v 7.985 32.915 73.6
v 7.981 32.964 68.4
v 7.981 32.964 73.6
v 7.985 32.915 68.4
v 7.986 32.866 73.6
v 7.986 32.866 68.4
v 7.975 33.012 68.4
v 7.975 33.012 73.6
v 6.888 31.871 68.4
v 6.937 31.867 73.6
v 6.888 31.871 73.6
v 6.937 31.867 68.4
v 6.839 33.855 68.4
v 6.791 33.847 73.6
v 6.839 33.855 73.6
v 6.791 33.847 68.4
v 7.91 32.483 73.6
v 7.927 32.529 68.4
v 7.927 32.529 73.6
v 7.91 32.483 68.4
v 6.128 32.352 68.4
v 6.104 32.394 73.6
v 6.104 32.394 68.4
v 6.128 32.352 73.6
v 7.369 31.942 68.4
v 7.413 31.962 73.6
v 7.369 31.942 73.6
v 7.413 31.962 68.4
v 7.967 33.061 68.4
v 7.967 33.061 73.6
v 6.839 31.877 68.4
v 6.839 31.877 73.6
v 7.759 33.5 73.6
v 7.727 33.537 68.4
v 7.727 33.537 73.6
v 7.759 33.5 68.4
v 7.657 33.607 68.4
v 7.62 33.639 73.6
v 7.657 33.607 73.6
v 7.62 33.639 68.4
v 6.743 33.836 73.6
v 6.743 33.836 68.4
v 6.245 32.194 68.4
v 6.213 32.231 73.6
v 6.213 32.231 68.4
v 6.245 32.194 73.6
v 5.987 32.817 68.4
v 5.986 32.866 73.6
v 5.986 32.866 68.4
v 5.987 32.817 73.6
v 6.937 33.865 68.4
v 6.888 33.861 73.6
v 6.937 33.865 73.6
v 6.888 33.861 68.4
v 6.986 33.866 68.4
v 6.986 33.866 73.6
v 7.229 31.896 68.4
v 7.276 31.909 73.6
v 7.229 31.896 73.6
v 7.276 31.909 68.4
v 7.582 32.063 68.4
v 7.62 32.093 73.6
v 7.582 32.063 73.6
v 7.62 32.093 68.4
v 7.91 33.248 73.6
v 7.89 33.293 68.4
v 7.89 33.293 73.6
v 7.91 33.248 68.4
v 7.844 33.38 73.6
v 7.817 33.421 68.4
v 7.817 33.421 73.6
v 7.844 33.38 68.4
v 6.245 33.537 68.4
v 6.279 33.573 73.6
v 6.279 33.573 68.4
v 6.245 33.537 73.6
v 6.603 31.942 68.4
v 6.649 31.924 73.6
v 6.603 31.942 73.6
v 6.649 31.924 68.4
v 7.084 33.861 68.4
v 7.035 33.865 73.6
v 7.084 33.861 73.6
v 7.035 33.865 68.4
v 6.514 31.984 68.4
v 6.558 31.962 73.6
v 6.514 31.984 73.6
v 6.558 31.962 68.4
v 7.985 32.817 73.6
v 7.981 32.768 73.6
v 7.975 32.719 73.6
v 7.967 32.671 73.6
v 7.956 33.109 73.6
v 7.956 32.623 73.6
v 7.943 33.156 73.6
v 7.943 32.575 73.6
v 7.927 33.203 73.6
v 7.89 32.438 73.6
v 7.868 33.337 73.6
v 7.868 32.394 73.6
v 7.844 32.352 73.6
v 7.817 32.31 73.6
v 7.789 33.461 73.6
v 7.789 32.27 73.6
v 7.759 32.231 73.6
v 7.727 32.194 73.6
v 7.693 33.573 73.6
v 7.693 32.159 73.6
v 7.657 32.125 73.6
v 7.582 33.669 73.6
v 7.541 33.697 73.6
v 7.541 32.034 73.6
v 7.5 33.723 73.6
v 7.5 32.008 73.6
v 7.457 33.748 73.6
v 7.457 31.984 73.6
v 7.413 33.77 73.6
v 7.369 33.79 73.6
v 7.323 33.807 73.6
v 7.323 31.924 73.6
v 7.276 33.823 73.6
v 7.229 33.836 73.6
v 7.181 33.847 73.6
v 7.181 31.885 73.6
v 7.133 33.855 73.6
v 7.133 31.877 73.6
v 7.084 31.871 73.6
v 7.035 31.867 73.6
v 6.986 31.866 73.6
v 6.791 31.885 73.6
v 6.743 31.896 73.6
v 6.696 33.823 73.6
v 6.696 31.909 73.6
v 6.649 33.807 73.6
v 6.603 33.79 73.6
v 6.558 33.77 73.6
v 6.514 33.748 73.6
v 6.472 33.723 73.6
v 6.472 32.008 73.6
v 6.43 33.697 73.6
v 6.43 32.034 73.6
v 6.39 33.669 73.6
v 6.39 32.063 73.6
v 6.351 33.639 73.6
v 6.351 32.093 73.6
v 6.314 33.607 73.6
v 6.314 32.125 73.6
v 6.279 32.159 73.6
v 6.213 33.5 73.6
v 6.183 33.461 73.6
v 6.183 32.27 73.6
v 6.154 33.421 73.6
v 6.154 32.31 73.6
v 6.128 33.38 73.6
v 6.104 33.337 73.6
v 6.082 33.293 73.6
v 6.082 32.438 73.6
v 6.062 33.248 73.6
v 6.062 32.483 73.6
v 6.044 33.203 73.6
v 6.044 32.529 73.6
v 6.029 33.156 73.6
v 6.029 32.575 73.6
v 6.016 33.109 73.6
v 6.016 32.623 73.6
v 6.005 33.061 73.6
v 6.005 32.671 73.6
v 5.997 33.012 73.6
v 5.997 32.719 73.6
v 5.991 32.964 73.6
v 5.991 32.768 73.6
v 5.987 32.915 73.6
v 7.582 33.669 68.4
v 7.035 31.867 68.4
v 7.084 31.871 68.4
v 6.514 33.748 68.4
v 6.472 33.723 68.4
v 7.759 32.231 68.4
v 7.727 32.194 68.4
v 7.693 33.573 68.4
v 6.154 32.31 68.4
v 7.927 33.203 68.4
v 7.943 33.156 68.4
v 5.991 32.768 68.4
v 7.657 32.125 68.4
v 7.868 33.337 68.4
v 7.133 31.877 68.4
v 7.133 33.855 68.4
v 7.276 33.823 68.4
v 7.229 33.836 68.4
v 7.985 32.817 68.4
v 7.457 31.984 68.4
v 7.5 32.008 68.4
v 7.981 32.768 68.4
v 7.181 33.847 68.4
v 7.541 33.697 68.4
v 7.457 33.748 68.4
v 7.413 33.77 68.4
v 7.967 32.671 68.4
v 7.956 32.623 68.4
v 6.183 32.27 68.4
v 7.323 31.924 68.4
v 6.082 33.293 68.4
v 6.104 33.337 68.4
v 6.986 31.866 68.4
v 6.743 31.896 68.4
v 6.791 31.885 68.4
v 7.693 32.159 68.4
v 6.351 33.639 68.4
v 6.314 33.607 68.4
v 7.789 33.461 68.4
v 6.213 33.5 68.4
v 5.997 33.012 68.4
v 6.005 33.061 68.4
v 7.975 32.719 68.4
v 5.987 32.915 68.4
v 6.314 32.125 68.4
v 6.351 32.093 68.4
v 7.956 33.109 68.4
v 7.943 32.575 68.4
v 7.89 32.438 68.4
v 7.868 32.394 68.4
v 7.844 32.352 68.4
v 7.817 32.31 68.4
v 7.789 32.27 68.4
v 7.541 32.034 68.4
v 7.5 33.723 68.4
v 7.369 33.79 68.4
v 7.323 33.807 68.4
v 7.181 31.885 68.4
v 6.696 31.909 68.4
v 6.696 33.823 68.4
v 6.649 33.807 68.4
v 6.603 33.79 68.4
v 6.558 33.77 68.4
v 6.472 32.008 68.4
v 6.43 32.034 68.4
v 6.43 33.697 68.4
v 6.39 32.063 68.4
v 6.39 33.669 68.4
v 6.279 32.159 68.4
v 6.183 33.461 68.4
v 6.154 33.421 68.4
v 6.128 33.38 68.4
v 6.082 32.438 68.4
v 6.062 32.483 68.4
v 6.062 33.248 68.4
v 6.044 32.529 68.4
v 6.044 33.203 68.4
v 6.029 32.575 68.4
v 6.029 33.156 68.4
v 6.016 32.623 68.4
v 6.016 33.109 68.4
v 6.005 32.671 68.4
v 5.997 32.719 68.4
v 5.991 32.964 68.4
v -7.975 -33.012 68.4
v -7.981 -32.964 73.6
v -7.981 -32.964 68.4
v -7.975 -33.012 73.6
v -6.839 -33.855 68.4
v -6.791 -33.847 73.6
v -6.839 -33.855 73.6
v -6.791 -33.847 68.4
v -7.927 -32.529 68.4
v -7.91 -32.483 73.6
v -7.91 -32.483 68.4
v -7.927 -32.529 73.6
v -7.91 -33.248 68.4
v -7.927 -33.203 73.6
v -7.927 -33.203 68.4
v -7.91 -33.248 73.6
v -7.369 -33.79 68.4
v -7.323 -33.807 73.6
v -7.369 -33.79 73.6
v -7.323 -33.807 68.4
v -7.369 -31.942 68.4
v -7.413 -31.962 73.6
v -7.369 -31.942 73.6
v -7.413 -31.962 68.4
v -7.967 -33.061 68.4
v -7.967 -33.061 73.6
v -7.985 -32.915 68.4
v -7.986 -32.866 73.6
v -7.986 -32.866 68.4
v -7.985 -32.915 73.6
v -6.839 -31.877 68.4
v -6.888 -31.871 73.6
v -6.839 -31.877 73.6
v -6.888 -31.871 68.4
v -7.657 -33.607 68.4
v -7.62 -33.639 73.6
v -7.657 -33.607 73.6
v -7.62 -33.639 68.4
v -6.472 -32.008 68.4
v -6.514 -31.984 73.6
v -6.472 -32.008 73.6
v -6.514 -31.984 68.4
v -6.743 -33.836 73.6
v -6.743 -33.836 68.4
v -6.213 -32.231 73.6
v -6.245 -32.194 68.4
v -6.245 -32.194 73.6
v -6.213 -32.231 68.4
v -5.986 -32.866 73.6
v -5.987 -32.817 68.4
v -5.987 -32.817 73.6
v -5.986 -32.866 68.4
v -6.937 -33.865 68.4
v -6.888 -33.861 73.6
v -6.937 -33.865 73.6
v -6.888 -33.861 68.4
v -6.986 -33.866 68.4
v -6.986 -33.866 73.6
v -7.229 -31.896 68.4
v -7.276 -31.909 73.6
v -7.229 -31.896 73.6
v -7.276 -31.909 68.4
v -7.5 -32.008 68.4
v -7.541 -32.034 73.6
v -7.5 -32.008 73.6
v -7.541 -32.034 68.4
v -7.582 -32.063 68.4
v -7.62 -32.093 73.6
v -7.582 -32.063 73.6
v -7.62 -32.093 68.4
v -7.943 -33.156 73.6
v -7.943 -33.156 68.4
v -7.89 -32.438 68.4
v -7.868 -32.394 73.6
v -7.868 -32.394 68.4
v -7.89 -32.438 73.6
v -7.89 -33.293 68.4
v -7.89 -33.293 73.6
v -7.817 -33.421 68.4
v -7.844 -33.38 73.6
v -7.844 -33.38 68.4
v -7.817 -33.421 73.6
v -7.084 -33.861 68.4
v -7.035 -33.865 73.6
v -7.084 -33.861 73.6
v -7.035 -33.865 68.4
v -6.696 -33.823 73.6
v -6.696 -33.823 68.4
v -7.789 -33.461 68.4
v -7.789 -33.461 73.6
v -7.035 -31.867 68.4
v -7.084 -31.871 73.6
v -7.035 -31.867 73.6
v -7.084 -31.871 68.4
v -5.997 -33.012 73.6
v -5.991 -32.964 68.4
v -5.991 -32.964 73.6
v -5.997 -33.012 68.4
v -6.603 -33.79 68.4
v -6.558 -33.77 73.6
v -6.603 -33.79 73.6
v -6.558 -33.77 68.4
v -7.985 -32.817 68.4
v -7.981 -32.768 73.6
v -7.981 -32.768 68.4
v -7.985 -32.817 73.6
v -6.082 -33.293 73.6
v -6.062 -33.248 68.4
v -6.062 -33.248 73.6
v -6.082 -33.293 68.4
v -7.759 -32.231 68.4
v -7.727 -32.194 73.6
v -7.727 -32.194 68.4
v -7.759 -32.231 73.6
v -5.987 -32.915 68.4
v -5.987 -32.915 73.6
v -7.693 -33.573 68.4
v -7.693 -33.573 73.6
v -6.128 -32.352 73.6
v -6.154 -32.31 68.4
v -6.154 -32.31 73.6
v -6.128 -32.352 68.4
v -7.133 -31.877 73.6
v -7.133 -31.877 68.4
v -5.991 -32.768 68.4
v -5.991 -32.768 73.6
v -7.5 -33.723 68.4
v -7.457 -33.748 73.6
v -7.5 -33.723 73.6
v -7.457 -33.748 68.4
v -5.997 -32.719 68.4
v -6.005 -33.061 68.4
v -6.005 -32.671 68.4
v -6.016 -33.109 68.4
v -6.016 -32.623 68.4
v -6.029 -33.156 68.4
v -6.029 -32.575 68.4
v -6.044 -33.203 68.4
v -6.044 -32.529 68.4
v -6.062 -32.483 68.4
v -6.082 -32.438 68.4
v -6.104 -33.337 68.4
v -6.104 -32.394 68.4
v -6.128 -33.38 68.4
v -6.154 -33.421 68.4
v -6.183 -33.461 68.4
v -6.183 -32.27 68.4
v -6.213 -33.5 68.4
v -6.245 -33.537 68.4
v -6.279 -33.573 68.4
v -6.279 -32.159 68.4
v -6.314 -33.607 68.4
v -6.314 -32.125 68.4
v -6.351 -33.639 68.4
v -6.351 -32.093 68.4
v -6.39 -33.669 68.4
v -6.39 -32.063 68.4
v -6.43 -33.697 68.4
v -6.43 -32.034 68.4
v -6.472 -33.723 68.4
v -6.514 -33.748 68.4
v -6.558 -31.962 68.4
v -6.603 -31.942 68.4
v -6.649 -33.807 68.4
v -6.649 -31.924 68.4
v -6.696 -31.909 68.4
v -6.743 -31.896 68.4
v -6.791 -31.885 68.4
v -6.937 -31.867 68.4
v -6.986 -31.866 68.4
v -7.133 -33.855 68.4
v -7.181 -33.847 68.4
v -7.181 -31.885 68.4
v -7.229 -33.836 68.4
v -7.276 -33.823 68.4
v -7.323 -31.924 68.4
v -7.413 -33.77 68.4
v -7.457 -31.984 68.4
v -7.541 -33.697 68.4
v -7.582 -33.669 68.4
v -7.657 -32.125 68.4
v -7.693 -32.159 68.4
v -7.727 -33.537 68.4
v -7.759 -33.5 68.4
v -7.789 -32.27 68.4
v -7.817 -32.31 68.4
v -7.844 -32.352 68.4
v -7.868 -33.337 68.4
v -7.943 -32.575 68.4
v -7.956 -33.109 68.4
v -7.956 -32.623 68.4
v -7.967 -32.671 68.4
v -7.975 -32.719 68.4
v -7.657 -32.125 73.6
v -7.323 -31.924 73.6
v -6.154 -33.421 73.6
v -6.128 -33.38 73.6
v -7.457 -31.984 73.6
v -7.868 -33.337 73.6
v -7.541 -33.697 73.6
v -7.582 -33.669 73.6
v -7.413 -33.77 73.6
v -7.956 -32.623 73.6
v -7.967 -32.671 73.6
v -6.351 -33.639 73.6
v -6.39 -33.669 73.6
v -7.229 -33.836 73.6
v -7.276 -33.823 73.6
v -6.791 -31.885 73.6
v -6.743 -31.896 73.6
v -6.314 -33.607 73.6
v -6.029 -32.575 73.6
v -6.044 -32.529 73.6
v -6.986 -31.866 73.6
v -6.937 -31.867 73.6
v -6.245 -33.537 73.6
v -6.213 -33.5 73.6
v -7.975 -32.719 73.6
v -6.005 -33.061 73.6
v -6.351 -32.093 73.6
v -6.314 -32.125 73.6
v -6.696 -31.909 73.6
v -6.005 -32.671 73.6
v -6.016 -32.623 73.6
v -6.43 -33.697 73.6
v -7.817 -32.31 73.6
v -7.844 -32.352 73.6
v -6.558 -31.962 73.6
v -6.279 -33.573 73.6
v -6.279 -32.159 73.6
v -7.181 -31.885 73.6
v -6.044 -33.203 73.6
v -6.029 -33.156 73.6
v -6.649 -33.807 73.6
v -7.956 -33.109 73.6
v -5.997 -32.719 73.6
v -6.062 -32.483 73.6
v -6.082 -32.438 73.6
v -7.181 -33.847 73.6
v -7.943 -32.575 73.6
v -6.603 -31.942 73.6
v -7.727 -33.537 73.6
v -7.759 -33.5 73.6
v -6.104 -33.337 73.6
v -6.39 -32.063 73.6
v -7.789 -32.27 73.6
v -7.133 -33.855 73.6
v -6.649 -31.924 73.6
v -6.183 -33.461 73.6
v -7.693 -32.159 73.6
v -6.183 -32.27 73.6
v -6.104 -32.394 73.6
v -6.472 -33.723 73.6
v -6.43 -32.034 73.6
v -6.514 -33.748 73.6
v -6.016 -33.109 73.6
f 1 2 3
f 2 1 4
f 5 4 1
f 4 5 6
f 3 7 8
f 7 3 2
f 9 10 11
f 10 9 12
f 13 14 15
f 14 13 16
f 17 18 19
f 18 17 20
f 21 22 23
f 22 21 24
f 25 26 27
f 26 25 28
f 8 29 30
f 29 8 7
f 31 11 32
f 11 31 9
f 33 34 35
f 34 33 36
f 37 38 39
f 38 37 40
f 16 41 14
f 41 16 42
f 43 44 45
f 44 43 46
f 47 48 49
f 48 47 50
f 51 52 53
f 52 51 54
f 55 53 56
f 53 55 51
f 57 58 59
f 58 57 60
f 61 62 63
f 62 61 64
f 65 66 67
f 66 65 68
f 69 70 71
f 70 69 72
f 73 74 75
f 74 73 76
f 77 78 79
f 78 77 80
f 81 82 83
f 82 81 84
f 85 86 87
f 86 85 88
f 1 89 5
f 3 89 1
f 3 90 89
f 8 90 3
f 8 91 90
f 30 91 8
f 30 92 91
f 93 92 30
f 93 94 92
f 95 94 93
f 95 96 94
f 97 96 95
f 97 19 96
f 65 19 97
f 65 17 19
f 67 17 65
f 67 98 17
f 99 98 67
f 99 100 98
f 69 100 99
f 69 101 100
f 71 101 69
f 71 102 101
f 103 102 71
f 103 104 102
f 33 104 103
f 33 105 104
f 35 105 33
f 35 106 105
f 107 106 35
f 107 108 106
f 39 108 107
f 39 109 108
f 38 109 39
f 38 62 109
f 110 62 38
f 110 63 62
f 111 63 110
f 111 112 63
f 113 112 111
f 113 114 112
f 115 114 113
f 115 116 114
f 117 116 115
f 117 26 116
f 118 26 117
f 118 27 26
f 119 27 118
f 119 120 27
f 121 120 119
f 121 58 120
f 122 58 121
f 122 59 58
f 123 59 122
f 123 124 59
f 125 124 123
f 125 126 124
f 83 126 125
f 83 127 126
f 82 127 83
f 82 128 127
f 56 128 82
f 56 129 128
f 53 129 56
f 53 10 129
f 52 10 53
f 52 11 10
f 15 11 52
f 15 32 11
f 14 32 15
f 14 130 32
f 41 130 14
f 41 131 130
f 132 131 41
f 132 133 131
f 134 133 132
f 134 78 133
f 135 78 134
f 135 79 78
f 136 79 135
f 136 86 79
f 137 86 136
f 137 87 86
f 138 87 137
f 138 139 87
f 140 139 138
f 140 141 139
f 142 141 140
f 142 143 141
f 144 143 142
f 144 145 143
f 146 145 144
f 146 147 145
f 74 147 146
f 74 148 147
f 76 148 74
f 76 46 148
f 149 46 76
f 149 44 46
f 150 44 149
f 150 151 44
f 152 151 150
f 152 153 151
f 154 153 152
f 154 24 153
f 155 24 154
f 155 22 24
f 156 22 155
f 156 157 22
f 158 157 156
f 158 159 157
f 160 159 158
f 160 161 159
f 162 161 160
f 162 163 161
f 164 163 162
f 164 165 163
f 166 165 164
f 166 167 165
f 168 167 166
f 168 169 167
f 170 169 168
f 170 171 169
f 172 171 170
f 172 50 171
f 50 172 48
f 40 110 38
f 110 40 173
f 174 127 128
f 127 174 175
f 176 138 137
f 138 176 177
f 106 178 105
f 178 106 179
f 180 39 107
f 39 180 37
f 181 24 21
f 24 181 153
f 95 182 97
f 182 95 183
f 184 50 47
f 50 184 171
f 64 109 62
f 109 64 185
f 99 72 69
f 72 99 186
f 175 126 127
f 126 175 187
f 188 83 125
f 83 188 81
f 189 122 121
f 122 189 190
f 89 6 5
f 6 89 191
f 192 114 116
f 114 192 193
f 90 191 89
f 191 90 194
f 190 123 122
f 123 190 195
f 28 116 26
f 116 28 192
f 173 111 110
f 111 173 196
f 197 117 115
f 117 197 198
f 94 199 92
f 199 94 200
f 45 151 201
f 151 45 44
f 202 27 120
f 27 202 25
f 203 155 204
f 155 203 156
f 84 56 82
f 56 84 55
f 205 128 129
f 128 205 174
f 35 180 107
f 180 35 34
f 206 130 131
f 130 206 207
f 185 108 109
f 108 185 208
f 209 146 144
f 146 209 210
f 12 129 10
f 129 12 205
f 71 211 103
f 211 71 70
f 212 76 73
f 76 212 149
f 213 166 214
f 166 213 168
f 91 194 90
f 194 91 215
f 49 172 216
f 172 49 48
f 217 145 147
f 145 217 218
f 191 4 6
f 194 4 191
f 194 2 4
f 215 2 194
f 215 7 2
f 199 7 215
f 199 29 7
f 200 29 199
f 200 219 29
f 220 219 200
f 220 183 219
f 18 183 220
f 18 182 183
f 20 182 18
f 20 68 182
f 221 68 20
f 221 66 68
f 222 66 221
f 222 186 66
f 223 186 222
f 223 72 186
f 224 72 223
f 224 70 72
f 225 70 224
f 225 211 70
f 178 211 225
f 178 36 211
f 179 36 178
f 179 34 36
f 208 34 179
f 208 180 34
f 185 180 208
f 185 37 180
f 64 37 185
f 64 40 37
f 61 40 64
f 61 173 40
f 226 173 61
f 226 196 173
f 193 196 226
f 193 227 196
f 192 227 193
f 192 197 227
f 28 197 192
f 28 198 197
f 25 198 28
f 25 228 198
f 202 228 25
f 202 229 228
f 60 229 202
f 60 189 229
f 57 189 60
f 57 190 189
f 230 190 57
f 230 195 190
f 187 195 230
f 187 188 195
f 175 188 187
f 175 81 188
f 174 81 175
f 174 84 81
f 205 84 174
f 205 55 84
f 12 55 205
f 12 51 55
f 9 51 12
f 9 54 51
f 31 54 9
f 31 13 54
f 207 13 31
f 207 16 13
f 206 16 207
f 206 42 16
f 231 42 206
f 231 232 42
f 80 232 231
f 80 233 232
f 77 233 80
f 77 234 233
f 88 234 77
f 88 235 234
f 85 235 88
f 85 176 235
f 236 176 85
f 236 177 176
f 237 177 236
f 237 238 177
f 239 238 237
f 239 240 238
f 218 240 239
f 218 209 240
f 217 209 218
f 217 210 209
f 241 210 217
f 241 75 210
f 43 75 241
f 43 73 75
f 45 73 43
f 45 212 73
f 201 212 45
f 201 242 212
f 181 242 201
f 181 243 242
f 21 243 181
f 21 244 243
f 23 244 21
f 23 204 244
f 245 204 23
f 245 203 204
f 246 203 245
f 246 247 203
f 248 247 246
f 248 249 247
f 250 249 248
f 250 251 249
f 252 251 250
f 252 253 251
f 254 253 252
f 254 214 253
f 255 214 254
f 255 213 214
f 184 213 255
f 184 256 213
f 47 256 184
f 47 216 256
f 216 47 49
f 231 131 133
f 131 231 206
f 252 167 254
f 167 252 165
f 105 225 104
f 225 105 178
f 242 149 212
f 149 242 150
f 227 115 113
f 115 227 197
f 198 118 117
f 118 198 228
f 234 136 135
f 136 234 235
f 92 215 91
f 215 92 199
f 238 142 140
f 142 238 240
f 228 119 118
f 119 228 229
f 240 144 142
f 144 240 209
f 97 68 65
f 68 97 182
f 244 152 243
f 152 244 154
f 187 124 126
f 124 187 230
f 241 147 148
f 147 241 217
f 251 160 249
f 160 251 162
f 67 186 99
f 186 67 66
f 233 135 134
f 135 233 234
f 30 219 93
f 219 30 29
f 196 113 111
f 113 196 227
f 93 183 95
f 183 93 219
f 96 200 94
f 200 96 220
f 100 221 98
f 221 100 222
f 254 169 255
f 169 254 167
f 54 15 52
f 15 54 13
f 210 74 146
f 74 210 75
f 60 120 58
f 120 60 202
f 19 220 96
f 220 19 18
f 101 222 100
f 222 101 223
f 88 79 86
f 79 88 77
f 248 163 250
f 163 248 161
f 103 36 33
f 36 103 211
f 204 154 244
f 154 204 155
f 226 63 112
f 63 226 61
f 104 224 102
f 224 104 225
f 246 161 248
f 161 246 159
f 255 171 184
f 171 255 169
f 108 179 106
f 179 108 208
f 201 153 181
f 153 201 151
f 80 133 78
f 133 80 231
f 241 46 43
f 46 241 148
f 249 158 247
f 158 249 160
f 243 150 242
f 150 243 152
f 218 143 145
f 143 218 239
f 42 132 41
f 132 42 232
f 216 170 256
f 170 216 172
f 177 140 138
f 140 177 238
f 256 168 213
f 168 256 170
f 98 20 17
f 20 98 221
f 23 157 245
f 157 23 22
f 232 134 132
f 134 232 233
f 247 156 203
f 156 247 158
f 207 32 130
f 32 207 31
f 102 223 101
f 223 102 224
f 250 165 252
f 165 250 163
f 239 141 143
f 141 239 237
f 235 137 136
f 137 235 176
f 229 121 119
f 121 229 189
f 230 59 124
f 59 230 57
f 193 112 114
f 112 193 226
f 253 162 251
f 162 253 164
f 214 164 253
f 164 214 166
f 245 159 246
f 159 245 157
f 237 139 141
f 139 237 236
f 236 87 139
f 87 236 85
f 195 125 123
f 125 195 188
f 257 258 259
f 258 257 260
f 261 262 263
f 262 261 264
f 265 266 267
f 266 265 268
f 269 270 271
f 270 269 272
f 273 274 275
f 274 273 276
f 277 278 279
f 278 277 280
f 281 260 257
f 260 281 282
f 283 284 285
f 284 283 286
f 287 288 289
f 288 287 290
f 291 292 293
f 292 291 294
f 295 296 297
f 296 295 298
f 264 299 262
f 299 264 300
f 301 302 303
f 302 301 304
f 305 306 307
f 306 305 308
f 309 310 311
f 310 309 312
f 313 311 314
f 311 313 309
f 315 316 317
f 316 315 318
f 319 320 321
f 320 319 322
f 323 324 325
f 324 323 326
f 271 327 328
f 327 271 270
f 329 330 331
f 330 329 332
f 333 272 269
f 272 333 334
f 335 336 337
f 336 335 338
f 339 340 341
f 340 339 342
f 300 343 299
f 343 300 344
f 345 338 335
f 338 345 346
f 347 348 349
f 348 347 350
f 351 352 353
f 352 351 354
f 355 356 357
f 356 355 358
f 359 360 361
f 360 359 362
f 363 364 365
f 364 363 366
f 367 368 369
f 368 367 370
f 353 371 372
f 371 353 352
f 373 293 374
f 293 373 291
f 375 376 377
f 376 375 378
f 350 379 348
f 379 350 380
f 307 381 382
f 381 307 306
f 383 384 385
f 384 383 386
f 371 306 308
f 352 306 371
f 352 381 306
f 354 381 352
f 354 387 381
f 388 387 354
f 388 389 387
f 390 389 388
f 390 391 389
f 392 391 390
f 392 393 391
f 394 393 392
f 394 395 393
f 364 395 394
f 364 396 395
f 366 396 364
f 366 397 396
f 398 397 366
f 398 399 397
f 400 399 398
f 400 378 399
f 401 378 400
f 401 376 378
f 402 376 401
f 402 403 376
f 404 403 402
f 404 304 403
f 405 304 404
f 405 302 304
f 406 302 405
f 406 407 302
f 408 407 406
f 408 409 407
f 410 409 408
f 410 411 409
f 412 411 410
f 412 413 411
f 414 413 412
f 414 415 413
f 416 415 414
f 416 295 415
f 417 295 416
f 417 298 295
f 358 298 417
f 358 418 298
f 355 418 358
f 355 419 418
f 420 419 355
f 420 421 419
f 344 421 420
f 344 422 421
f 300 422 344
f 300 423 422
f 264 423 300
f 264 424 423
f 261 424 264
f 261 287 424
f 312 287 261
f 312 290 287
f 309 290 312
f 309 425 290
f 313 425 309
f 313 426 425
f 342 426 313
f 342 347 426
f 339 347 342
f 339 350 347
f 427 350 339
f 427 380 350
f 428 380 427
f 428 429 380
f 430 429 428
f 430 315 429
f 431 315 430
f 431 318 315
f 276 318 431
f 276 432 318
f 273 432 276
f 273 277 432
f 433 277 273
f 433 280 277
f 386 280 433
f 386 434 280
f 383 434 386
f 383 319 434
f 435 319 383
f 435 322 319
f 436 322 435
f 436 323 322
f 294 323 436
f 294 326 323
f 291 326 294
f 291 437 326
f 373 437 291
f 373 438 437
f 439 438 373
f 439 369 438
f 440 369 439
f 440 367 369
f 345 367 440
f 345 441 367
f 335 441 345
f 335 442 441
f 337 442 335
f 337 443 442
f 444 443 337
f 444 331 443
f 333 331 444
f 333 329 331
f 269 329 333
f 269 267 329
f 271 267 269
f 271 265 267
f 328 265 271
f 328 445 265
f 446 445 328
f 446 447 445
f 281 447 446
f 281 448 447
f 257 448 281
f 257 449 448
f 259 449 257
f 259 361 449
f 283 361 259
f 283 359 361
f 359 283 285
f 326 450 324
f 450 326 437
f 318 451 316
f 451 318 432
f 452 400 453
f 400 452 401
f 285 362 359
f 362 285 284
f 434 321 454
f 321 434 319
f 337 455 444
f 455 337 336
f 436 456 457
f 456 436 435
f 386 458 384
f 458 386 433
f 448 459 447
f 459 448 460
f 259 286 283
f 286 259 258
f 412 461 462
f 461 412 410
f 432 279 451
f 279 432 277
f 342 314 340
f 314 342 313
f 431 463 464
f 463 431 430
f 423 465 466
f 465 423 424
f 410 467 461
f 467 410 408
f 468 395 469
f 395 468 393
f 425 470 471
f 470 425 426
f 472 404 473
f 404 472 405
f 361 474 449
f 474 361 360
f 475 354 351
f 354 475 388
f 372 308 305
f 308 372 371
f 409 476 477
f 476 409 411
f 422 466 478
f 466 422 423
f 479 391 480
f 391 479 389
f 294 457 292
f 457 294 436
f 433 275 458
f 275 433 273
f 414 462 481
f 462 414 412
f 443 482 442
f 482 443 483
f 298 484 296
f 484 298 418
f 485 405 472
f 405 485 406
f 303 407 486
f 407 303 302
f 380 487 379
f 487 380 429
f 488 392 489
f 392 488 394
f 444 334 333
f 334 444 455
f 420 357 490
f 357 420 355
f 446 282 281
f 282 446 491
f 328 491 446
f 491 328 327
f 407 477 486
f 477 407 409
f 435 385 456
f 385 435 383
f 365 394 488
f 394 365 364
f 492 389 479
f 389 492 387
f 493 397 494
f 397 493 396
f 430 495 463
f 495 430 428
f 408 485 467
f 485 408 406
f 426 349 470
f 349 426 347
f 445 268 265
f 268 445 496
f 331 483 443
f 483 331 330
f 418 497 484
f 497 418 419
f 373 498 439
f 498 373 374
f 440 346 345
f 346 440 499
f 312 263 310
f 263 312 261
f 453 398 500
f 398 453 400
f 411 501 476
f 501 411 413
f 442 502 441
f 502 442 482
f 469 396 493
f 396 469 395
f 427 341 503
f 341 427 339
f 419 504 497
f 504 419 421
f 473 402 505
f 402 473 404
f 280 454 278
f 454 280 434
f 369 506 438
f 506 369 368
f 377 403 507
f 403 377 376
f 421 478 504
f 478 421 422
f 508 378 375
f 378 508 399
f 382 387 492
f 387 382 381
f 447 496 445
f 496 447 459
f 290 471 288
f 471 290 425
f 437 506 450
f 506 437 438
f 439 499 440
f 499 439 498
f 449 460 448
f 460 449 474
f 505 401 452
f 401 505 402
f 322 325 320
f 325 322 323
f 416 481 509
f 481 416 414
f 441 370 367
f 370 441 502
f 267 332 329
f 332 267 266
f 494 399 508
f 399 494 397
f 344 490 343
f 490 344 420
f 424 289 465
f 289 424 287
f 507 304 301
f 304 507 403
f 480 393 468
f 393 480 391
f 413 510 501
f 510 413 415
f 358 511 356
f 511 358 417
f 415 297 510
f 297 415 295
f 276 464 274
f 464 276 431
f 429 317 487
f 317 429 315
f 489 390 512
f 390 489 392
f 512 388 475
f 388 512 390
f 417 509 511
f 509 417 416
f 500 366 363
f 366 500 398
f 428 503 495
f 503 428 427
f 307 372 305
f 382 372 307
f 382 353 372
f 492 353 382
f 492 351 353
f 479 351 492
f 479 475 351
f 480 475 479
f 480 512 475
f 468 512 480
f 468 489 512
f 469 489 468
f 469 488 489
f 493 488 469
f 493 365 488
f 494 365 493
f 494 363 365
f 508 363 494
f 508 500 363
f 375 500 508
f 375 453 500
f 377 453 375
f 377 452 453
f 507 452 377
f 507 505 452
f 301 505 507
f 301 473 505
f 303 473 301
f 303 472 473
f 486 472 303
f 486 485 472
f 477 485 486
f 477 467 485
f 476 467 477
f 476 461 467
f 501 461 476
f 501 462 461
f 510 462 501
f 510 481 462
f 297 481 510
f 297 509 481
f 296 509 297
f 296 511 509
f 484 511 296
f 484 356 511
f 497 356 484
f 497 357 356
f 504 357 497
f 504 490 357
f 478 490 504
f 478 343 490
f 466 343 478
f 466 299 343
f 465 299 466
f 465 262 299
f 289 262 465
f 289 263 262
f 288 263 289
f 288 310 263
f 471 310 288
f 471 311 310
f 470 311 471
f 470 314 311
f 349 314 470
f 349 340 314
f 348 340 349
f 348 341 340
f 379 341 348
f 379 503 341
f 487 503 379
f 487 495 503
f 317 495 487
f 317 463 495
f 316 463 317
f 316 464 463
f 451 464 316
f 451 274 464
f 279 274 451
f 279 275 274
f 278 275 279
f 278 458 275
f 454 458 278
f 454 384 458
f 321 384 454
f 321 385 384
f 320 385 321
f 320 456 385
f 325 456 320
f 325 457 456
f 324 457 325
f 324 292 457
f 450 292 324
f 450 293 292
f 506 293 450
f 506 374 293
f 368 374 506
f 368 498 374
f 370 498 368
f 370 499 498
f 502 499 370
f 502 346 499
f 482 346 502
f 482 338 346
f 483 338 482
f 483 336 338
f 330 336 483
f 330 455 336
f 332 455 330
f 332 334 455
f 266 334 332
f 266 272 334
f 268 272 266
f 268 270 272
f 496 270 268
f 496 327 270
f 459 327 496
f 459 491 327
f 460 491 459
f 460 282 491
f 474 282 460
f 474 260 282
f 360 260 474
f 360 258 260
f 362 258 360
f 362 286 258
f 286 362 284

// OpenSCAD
/* Desk jar with bayonet lid
   Print: PETG, Bambu A1, 0.4 nozzle, no supports.
   Jar prints base-down. Lid prints top-face-down (skirt up).
   All dimensions mm.
*/
part = "jar"; // [jar, lid, assembly]
$fn = 128;

// ---- Parameters ----
R_out   = 37.5;   // jar / lid outside radius (75 dia, flush)
R_in    = 35.0;   // jar main bore radius (70 dia)
wall    = R_out - R_in; // 2.5
floor_t = 2.5;
jar_h   = 82.5;   // rim height; bore depth = jar_h - floor_t = 80
neck_ro = 35.0;   // stepped neck outside
neck_ri = 32.0;   // neck bore (3.0 neck wall)
shoulder_z = 60.0;

slot_floor_r = 33.6; // groove floor radius: leaves 1.6 wall to neck bore
slot_z  = 71.0;      // centre of horizontal bayonet run
slot_h  = 5.2;       // horizontal slot height
entry_w = 7.2;       // vertical entry width

lid_h   = 20.5;      // lid total height in print orientation
lid_ro  = 37.5;
skirt_ri = 35.6;     // 0.6 radial clearance over neck_ro=35.0
lid_t   = 2.5;       // lid top disc thickness
lug_w   = 6.0;       // tangential
lug_h   = 4.0;       // axial, 0.6 clearance top/bottom in slot
lug_tip_r = 33.9;    // 0.3 clearance to slot floor 33.6
lug_cz_print = 14.0; // lid print z of lug centre -> 71 in assembly
asm_top = 85.0;      // jar rim 82.5 + lid disc 2.5

cadverify_only = "";
module instance(name, part, unit = 1) {
    echo(cadverify_instance = [name, part, unit]);
    if (cadverify_only == "" || cadverify_only == name) children();
}

// ---- Jar ----
module jar_body() {
    rotate_extrude()
    polygon(points=[
        [0,0],[33.5,0],[37.5,4],[37.5,shoulder_z],
        [neck_ro,62.5],[neck_ro,81.3],[33.8,jar_h],[neck_ri,jar_h],
        [neck_ri,65.5],[R_in,62.5],[R_in,6.5],[31.0,floor_t],[0,floor_t]
    ]);
}

module wedge_sector(z0,h) {
    translate([0,0,z0])
    linear_extrude(height=h)
    polygon(points=concat([[0,0]],
        [for(a=[-6:3:97]) 40*[cos(a),sin(a)]]));
}

module slot_cut_one() {
    union() {
        // vertical entry, open through rim
        translate([35.05,0,75.7]) cube([2.9,entry_w,14.6],center=true);
        // horizontal circumferential run
        intersection() {
            difference() {
                translate([0,0,slot_z-slot_h/2]) cylinder(h=slot_h,r=36.5);
                translate([0,0,slot_z-slot_h/2-0.1]) cylinder(h=slot_h+0.2,r=slot_floor_r);
            }
            wedge_sector(slot_z-slot_h/2, slot_h);
        }
    }
}

module bump_one() {
    // Detent bump: vertical pin segment standing out of groove floor.
    // At 78 deg, centred radially on the groove floor.
    translate([slot_floor_r*cos(78), slot_floor_r*sin(78), slot_z])
        cylinder(h=slot_h, r=1.0, center=true);
}

module jar() {
    union() {
        difference() {
            jar_body();
            slot_cut_one();
            rotate([0,0,180]) slot_cut_one();
        }
        bump_one();
        rotate([0,0,180]) bump_one();
    }
}

// ---- Lid ----
module lid_body() {
    rotate_extrude()
    polygon(points=[
        [0,0],[34.5,0],[37.5,3],[37.5,19.3],[36.3,lid_h],
        [skirt_ri,lid_h],[skirt_ri,5.5],[32.6,lid_t],[0,lid_t]
    ]);
}

module lug_one() {
    // along +Y, in lid print coordinates
    translate([0,34.75,lug_cz_print]) cube([lug_w,2.0,lug_h],center=true);
}

module lid() {
    union() {
        lid_body();
        lug_one();
        rotate([0,0,180]) lug_one();
    }
}

// ---- Specs and output ----
if (part == "jar") {
    echo(cadverify_spec = [
        ["bounds", [[-R_out,-R_out,0],[R_out,R_out,jar_h]]],
        ["bodies", 1],
        ["through_holes", 0],
        ["support_faces", [["base", "-z", 3000]]],
        ["overhangs_allowed", [
            ["bayonet slot ceiling, 1.4mm radial groove, PETG bridges this short span",
             [[-36,-36,68],[36,36,74]]]
        ]],
        ["copies", 1],
        ["details", [
            ["main_bore", "void", [[-24,-24,10],[24,24,58]], 0.99],
            ["entry_slot", "void", [[33.7,-3,75],[36.5,3,82.4]], 0.95],
            ["horizontal_slot", "void", [[22,22,69],[26.5,26.5,73]], 0.65],
            ["detent_bump", "material", [[5.5,31.5,69.5],[8.5,34.5,72.5]], 0.35],
            ["side_wall", "thickness", [40,0,30], [-1,0,0], wall],
            ["floor", "thickness", [0,0,-5], [0,0,1], floor_t],
            ["groove_floor_wall", "thickness",
                [40*cos(45),40*sin(45),slot_z], [-cos(45),-sin(45),0], 1.6],
            ["bayonet_slots", "view", [[20,-36,64],[38,36,82.5]]]
        ]]
    ]);
    jar();
} else if (part == "lid") {
    echo(cadverify_spec = [
        ["bounds", [[-lid_ro,-lid_ro,0],[lid_ro,lid_ro,lid_h]]],
        ["bodies", 1],
        ["through_holes", 0],
        ["support_faces", [["top_on_bed", "-z", 3000]]],
        ["overhangs_allowed", [
            ["lug underside, 1.7mm radial lug, PETG bridges this short span",
             [[-4,33,11],[4,36.5,17]]],
            ["lug underside opposite, 1.7mm radial lug, PETG bridges this short span",
             [[-4,-36.5,11],[4,-33,17]]]
        ]],
        ["copies", 1],
        ["details", [
            ["lid_cavity", "void", [[-24,-24,8],[24,24,19]], 0.99],
            ["lug", "material", [[-3,33.5,12],[3,36,16]], 0.65],
            ["lug_opposite", "material", [[-3,-36,12],[3,-33.5,16]], 0.65],
            ["top_disc", "thickness", [0,0,-5], [0,0,1], lid_t],
            ["skirt_wall", "thickness", [40,0,15], [-1,0,0], 1.9],
            ["lug_shape", "view", [[-5,32,10],[5,37,18]]]
        ]]
    ]);
    lid();
} else if (part == "assembly") {
    echo(cadverify_spec = [
        ["bounds", [[-R_out,-R_out,0],[R_out,R_out,asm_top]]],
        ["support_faces", [["desk", "-z", 3000]]],
        ["allowed_interferences", []],
        ["motions", [
            ["lock_turn", ["lid"], "rotate", [0,0,0], [0,0,1], [-90,0],
                ["flex", [["lid","jar",1.0,
                    "PETG skirt/lug flexes out over 0.8mm detent bump in slot"]]]]
        ]],
        ["assembly_order", [
            [["jar"], [0,0,0]],
            [["lid"], [0,0,1], ["rotate", [0,0,slot_z], [0,0,1], 90]]
        ]]
    ]);
    instance("jar", "jar") jar();
    instance("lid", "lid")
        translate([0,0,asm_top]) rotate([180,0,0]) lid();
}
